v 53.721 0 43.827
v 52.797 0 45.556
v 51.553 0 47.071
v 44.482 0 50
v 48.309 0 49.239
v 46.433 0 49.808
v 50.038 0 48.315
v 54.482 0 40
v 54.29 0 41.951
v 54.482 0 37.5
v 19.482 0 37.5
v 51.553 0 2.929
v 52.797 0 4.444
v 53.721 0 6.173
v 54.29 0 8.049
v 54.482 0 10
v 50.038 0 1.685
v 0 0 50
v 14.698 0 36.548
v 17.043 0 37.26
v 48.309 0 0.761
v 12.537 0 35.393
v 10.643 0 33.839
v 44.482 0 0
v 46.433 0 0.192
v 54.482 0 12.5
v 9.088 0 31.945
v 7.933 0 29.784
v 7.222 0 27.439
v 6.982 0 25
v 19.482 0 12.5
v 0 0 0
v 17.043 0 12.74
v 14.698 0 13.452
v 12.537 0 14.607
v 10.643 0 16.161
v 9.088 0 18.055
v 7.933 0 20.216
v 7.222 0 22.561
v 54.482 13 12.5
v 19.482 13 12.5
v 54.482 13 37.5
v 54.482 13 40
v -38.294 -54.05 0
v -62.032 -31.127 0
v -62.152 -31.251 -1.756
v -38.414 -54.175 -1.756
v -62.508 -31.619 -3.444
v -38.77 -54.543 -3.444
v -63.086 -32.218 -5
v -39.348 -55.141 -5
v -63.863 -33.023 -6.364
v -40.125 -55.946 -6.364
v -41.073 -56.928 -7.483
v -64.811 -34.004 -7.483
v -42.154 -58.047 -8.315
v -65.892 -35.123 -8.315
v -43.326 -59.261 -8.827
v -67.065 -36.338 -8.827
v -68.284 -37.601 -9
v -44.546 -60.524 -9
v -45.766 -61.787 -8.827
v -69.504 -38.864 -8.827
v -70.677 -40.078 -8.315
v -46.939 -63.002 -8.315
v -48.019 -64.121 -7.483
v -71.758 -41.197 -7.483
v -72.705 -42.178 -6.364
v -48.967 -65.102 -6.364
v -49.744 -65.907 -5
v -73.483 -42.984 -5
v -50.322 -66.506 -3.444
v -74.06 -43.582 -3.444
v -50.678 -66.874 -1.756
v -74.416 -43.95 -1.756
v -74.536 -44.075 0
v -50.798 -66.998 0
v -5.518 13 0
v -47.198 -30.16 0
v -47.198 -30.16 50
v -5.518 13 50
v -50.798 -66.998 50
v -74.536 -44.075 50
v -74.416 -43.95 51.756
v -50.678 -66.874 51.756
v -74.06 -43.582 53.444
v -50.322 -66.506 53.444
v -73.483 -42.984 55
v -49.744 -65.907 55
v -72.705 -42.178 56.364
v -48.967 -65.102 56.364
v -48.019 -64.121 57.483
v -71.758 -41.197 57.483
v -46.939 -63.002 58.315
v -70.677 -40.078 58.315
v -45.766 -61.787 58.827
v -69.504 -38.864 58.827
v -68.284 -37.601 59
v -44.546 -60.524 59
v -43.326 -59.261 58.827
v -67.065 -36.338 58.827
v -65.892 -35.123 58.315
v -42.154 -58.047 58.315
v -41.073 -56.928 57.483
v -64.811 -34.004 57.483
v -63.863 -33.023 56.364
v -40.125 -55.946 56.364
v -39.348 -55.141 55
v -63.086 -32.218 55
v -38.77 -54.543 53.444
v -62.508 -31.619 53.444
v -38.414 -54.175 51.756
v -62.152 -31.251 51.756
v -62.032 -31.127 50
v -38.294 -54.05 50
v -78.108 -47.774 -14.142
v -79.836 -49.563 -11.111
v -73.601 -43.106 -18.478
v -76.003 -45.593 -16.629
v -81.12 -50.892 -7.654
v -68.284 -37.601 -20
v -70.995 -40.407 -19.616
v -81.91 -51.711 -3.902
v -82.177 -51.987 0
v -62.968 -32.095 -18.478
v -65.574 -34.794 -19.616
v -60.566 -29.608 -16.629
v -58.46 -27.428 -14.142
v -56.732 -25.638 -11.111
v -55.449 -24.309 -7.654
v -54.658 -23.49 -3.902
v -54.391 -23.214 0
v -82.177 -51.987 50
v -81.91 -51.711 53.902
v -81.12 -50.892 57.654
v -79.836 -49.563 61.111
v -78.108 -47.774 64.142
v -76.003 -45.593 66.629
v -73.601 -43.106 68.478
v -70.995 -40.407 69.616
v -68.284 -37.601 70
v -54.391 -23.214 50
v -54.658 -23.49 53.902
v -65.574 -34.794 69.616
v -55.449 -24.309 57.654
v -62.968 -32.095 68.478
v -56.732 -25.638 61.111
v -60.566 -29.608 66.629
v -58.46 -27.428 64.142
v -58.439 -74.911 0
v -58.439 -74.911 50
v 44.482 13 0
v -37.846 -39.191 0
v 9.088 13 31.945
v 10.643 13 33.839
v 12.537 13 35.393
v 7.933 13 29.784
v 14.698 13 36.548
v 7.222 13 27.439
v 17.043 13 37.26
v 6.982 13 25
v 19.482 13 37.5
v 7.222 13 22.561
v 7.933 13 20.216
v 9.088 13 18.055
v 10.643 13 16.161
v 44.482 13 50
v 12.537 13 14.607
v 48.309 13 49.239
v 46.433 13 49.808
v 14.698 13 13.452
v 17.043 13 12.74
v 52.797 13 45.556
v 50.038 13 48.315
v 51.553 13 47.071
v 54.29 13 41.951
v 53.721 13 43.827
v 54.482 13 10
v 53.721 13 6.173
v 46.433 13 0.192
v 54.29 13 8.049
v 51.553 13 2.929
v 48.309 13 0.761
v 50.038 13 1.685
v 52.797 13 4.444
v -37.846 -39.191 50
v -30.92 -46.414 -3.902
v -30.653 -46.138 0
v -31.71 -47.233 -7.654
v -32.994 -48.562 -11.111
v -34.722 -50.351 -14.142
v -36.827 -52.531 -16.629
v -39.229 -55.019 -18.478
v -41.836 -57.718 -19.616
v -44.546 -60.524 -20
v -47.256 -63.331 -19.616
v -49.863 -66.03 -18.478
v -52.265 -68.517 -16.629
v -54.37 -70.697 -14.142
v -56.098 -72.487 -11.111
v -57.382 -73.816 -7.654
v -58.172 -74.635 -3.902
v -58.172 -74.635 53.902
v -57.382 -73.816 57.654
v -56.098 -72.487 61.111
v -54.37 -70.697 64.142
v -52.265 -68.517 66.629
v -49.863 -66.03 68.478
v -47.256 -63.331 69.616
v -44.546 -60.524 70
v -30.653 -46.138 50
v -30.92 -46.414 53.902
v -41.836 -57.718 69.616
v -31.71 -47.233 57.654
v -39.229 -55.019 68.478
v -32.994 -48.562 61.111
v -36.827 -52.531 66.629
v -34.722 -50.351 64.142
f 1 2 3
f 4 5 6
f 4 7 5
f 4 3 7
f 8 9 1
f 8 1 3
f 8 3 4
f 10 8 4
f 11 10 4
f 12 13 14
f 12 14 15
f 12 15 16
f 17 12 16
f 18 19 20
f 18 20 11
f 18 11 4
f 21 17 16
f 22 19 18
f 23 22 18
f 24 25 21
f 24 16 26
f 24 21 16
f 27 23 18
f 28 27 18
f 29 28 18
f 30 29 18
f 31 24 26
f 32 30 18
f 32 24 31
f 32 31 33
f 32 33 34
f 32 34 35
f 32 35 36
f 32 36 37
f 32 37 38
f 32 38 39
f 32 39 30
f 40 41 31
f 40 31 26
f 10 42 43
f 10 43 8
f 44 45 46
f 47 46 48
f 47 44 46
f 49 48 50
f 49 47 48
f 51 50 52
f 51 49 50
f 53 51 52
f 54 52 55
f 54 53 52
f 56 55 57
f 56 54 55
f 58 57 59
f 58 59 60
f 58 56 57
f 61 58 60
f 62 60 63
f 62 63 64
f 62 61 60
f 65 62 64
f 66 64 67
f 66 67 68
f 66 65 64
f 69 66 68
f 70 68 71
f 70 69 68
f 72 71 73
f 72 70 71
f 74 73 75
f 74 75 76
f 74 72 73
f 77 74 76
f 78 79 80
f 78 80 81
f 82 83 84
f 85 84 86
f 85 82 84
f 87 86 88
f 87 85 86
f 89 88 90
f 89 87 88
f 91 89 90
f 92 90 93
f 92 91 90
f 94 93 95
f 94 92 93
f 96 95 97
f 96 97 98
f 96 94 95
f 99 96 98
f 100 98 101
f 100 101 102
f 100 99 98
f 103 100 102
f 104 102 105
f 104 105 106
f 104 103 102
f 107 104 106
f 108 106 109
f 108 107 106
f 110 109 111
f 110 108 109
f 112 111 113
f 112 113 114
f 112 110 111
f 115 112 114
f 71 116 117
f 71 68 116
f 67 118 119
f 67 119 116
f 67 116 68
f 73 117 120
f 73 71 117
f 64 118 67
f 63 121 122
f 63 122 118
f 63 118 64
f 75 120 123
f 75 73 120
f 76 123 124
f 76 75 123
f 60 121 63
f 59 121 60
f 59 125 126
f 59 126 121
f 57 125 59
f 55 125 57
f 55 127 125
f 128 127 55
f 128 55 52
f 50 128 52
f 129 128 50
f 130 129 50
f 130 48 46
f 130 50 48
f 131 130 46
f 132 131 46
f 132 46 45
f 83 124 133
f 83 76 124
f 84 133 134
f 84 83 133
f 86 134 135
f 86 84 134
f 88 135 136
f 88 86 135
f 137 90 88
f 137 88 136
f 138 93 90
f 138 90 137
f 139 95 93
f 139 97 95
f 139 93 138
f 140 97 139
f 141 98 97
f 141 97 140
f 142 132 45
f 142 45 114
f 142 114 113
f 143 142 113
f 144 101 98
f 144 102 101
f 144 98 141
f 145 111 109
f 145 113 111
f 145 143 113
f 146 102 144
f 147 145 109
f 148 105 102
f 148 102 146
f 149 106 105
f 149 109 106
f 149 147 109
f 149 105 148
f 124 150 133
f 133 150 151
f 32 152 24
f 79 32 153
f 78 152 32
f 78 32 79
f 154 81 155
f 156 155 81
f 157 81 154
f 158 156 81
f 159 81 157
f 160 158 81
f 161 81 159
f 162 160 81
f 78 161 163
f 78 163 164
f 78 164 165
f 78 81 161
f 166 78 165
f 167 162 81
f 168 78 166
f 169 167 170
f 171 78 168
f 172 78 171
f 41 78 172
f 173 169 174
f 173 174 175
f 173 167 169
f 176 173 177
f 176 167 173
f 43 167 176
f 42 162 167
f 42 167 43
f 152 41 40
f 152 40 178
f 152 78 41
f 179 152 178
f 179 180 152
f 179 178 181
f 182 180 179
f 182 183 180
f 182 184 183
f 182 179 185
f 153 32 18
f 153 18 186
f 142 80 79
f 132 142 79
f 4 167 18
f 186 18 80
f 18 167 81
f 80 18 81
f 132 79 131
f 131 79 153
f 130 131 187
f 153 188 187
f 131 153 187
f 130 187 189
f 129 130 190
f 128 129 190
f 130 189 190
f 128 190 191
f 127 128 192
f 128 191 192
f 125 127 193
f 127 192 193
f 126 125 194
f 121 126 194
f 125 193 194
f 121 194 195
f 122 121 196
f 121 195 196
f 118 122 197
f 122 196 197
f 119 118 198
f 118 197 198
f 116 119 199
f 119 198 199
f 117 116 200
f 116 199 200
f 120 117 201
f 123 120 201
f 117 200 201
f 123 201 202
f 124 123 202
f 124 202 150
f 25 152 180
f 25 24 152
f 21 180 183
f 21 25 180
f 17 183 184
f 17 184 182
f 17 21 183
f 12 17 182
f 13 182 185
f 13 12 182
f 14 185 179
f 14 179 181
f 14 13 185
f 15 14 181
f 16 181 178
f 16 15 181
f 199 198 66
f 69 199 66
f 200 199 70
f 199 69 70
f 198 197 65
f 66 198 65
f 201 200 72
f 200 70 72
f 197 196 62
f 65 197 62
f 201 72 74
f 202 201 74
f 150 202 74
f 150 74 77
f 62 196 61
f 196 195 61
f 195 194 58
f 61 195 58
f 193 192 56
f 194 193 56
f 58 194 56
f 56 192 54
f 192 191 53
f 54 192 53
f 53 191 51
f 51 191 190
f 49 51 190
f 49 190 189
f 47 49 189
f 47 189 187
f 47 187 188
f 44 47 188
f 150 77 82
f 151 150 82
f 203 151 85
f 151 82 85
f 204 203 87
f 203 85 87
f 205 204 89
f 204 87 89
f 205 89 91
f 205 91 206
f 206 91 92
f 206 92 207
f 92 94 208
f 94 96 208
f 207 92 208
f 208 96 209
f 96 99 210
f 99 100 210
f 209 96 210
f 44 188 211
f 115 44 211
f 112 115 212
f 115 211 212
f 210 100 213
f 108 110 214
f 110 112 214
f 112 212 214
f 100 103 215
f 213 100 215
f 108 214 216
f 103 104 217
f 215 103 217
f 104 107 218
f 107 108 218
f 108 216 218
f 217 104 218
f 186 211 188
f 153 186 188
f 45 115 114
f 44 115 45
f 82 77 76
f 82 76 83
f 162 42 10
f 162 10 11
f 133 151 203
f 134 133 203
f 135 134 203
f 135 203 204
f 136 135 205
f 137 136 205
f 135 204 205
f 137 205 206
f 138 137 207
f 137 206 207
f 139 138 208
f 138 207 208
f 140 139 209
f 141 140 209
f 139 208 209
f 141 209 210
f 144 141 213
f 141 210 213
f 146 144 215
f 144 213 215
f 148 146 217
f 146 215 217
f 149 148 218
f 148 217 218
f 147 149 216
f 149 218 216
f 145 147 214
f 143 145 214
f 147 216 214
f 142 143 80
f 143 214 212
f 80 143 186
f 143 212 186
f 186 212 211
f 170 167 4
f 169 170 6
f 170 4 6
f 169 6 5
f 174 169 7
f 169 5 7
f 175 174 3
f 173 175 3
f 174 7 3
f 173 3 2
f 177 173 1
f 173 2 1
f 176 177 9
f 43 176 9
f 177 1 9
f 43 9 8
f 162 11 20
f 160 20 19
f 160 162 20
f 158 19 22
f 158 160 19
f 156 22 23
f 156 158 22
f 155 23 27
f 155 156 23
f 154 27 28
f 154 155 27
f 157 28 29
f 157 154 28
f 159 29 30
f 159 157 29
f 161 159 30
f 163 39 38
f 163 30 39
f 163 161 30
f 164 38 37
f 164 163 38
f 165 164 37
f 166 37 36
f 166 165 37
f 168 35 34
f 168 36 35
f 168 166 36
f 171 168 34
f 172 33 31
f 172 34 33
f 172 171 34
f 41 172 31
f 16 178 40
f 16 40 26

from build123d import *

# Parameters (mm, degrees)
BOSS_EXTRUDE1_DEPTH = 50
BOSS_EXTRUDE2_DEPTH = 16.5
CUT_EXTRUDE1_DEPTH  = 16.5
CUT_EXTRUDE2_REACH  = 141.217
FILLET1_R           = 10


with BuildPart() as part:
    # Sketch1 → Boss-Extrude1 (new body)
    with BuildSketch(Plane.XY):
        Polygon((54.481827389, 0), (0, 0), (-51.739424843, -53.577742843), (-61.090842247, -44.547184027), (-5.518172611, 13), (54.481827389, 13), align=None)
    extrude(amount=BOSS_EXTRUDE1_DEPTH)

    # Sketch4 → Boss-Extrude2 (add, symmetric)
    with BuildSketch(Plane(origin=(-4.675708702, 4.515279408, 0), x_dir=(0, 0, -1), z_dir=(0.7193398003386524, -0.6946583704589959, 0))):
        with BuildLine():
            Line((-50, -54.481827389), (0, -54.481827389))
            ThreePointArc((0, -54.481827389), (20, -74.481827389), (0, -94.481827389))
            Line((0, -94.481827389), (-50, -94.481827389))
            ThreePointArc((-50, -94.481827389), (-70, -74.481827389), (-50, -54.481827389))
        make_face()
        with BuildLine():
            Line((-50, -65.481827389), (0, -65.481827389))
            ThreePointArc((0, -65.481827389), (9, -74.481827389), (0, -83.481827389))
            Line((0, -83.481827389), (-50, -83.481827389))
            ThreePointArc((-50, -83.481827389), (-59, -74.481827389), (-50, -65.481827389))
        make_face(mode=Mode.SUBTRACT)
    extrude(amount=BOSS_EXTRUDE2_DEPTH, both=True)

    # Sketch4<2> → Cut-Extrude1 (cut, symmetric)
    with BuildSketch(Plane(origin=(-4.675708702, 4.515279408, 0), x_dir=(0, 0, -1), z_dir=(0.7193398003386524, -0.6946583704589959, 0))):
        with BuildLine():
            Line((-50, -83.481827389), (0, -83.481827389))
            ThreePointArc((0, -83.481827389), (9, -74.481827389), (0, -65.481827389))
            Line((0, -65.481827389), (-50, -65.481827389))
            ThreePointArc((-50, -65.481827389), (-59, -74.481827389), (-50, -83.481827389))
        make_face()
    extrude(amount=CUT_EXTRUDE1_DEPTH, both=True, mode=Mode.SUBTRACT)

    # Sketch6 → Cut-Extrude2 (cut, up to next)
    with BuildSketch(Plane(origin=(0, 13, 0), x_dir=(1, 0, 0), z_dir=(0, 1, 0)), mode=Mode.PRIVATE) as cut_extrude2_sk1:
        with BuildLine():
            Line((19.481827389, -12.5), (54.481827389, -12.5))
            ThreePointArc((54.481827389, -12.5), (66.981827389, -25), (54.481827389, -37.5))
            Line((54.481827389, -37.5), (19.481827389, -37.5))
            ThreePointArc((19.481827389, -37.5), (6.981827389, -25), (19.481827389, -12.5))
        make_face()
    cut_extrude2_tool1 = extrude(cut_extrude2_sk1.sketch, amount=-CUT_EXTRUDE2_REACH, mode=Mode.PRIVATE) & part.part
    add(cut_extrude2_tool1.solids().sort_by_distance((36.981827, 13, 25))[0], mode=Mode.SUBTRACT)

    # Fillet1
    fillet1_edges = [part.edges().sort_by_distance(p)[0] for p in [
        (54.481827389, 6.5, 50),
        (54.481827389, 6.5, 0),
    ]]
    fillet(fillet1_edges, radius=FILLET1_R)


solid = part.part
